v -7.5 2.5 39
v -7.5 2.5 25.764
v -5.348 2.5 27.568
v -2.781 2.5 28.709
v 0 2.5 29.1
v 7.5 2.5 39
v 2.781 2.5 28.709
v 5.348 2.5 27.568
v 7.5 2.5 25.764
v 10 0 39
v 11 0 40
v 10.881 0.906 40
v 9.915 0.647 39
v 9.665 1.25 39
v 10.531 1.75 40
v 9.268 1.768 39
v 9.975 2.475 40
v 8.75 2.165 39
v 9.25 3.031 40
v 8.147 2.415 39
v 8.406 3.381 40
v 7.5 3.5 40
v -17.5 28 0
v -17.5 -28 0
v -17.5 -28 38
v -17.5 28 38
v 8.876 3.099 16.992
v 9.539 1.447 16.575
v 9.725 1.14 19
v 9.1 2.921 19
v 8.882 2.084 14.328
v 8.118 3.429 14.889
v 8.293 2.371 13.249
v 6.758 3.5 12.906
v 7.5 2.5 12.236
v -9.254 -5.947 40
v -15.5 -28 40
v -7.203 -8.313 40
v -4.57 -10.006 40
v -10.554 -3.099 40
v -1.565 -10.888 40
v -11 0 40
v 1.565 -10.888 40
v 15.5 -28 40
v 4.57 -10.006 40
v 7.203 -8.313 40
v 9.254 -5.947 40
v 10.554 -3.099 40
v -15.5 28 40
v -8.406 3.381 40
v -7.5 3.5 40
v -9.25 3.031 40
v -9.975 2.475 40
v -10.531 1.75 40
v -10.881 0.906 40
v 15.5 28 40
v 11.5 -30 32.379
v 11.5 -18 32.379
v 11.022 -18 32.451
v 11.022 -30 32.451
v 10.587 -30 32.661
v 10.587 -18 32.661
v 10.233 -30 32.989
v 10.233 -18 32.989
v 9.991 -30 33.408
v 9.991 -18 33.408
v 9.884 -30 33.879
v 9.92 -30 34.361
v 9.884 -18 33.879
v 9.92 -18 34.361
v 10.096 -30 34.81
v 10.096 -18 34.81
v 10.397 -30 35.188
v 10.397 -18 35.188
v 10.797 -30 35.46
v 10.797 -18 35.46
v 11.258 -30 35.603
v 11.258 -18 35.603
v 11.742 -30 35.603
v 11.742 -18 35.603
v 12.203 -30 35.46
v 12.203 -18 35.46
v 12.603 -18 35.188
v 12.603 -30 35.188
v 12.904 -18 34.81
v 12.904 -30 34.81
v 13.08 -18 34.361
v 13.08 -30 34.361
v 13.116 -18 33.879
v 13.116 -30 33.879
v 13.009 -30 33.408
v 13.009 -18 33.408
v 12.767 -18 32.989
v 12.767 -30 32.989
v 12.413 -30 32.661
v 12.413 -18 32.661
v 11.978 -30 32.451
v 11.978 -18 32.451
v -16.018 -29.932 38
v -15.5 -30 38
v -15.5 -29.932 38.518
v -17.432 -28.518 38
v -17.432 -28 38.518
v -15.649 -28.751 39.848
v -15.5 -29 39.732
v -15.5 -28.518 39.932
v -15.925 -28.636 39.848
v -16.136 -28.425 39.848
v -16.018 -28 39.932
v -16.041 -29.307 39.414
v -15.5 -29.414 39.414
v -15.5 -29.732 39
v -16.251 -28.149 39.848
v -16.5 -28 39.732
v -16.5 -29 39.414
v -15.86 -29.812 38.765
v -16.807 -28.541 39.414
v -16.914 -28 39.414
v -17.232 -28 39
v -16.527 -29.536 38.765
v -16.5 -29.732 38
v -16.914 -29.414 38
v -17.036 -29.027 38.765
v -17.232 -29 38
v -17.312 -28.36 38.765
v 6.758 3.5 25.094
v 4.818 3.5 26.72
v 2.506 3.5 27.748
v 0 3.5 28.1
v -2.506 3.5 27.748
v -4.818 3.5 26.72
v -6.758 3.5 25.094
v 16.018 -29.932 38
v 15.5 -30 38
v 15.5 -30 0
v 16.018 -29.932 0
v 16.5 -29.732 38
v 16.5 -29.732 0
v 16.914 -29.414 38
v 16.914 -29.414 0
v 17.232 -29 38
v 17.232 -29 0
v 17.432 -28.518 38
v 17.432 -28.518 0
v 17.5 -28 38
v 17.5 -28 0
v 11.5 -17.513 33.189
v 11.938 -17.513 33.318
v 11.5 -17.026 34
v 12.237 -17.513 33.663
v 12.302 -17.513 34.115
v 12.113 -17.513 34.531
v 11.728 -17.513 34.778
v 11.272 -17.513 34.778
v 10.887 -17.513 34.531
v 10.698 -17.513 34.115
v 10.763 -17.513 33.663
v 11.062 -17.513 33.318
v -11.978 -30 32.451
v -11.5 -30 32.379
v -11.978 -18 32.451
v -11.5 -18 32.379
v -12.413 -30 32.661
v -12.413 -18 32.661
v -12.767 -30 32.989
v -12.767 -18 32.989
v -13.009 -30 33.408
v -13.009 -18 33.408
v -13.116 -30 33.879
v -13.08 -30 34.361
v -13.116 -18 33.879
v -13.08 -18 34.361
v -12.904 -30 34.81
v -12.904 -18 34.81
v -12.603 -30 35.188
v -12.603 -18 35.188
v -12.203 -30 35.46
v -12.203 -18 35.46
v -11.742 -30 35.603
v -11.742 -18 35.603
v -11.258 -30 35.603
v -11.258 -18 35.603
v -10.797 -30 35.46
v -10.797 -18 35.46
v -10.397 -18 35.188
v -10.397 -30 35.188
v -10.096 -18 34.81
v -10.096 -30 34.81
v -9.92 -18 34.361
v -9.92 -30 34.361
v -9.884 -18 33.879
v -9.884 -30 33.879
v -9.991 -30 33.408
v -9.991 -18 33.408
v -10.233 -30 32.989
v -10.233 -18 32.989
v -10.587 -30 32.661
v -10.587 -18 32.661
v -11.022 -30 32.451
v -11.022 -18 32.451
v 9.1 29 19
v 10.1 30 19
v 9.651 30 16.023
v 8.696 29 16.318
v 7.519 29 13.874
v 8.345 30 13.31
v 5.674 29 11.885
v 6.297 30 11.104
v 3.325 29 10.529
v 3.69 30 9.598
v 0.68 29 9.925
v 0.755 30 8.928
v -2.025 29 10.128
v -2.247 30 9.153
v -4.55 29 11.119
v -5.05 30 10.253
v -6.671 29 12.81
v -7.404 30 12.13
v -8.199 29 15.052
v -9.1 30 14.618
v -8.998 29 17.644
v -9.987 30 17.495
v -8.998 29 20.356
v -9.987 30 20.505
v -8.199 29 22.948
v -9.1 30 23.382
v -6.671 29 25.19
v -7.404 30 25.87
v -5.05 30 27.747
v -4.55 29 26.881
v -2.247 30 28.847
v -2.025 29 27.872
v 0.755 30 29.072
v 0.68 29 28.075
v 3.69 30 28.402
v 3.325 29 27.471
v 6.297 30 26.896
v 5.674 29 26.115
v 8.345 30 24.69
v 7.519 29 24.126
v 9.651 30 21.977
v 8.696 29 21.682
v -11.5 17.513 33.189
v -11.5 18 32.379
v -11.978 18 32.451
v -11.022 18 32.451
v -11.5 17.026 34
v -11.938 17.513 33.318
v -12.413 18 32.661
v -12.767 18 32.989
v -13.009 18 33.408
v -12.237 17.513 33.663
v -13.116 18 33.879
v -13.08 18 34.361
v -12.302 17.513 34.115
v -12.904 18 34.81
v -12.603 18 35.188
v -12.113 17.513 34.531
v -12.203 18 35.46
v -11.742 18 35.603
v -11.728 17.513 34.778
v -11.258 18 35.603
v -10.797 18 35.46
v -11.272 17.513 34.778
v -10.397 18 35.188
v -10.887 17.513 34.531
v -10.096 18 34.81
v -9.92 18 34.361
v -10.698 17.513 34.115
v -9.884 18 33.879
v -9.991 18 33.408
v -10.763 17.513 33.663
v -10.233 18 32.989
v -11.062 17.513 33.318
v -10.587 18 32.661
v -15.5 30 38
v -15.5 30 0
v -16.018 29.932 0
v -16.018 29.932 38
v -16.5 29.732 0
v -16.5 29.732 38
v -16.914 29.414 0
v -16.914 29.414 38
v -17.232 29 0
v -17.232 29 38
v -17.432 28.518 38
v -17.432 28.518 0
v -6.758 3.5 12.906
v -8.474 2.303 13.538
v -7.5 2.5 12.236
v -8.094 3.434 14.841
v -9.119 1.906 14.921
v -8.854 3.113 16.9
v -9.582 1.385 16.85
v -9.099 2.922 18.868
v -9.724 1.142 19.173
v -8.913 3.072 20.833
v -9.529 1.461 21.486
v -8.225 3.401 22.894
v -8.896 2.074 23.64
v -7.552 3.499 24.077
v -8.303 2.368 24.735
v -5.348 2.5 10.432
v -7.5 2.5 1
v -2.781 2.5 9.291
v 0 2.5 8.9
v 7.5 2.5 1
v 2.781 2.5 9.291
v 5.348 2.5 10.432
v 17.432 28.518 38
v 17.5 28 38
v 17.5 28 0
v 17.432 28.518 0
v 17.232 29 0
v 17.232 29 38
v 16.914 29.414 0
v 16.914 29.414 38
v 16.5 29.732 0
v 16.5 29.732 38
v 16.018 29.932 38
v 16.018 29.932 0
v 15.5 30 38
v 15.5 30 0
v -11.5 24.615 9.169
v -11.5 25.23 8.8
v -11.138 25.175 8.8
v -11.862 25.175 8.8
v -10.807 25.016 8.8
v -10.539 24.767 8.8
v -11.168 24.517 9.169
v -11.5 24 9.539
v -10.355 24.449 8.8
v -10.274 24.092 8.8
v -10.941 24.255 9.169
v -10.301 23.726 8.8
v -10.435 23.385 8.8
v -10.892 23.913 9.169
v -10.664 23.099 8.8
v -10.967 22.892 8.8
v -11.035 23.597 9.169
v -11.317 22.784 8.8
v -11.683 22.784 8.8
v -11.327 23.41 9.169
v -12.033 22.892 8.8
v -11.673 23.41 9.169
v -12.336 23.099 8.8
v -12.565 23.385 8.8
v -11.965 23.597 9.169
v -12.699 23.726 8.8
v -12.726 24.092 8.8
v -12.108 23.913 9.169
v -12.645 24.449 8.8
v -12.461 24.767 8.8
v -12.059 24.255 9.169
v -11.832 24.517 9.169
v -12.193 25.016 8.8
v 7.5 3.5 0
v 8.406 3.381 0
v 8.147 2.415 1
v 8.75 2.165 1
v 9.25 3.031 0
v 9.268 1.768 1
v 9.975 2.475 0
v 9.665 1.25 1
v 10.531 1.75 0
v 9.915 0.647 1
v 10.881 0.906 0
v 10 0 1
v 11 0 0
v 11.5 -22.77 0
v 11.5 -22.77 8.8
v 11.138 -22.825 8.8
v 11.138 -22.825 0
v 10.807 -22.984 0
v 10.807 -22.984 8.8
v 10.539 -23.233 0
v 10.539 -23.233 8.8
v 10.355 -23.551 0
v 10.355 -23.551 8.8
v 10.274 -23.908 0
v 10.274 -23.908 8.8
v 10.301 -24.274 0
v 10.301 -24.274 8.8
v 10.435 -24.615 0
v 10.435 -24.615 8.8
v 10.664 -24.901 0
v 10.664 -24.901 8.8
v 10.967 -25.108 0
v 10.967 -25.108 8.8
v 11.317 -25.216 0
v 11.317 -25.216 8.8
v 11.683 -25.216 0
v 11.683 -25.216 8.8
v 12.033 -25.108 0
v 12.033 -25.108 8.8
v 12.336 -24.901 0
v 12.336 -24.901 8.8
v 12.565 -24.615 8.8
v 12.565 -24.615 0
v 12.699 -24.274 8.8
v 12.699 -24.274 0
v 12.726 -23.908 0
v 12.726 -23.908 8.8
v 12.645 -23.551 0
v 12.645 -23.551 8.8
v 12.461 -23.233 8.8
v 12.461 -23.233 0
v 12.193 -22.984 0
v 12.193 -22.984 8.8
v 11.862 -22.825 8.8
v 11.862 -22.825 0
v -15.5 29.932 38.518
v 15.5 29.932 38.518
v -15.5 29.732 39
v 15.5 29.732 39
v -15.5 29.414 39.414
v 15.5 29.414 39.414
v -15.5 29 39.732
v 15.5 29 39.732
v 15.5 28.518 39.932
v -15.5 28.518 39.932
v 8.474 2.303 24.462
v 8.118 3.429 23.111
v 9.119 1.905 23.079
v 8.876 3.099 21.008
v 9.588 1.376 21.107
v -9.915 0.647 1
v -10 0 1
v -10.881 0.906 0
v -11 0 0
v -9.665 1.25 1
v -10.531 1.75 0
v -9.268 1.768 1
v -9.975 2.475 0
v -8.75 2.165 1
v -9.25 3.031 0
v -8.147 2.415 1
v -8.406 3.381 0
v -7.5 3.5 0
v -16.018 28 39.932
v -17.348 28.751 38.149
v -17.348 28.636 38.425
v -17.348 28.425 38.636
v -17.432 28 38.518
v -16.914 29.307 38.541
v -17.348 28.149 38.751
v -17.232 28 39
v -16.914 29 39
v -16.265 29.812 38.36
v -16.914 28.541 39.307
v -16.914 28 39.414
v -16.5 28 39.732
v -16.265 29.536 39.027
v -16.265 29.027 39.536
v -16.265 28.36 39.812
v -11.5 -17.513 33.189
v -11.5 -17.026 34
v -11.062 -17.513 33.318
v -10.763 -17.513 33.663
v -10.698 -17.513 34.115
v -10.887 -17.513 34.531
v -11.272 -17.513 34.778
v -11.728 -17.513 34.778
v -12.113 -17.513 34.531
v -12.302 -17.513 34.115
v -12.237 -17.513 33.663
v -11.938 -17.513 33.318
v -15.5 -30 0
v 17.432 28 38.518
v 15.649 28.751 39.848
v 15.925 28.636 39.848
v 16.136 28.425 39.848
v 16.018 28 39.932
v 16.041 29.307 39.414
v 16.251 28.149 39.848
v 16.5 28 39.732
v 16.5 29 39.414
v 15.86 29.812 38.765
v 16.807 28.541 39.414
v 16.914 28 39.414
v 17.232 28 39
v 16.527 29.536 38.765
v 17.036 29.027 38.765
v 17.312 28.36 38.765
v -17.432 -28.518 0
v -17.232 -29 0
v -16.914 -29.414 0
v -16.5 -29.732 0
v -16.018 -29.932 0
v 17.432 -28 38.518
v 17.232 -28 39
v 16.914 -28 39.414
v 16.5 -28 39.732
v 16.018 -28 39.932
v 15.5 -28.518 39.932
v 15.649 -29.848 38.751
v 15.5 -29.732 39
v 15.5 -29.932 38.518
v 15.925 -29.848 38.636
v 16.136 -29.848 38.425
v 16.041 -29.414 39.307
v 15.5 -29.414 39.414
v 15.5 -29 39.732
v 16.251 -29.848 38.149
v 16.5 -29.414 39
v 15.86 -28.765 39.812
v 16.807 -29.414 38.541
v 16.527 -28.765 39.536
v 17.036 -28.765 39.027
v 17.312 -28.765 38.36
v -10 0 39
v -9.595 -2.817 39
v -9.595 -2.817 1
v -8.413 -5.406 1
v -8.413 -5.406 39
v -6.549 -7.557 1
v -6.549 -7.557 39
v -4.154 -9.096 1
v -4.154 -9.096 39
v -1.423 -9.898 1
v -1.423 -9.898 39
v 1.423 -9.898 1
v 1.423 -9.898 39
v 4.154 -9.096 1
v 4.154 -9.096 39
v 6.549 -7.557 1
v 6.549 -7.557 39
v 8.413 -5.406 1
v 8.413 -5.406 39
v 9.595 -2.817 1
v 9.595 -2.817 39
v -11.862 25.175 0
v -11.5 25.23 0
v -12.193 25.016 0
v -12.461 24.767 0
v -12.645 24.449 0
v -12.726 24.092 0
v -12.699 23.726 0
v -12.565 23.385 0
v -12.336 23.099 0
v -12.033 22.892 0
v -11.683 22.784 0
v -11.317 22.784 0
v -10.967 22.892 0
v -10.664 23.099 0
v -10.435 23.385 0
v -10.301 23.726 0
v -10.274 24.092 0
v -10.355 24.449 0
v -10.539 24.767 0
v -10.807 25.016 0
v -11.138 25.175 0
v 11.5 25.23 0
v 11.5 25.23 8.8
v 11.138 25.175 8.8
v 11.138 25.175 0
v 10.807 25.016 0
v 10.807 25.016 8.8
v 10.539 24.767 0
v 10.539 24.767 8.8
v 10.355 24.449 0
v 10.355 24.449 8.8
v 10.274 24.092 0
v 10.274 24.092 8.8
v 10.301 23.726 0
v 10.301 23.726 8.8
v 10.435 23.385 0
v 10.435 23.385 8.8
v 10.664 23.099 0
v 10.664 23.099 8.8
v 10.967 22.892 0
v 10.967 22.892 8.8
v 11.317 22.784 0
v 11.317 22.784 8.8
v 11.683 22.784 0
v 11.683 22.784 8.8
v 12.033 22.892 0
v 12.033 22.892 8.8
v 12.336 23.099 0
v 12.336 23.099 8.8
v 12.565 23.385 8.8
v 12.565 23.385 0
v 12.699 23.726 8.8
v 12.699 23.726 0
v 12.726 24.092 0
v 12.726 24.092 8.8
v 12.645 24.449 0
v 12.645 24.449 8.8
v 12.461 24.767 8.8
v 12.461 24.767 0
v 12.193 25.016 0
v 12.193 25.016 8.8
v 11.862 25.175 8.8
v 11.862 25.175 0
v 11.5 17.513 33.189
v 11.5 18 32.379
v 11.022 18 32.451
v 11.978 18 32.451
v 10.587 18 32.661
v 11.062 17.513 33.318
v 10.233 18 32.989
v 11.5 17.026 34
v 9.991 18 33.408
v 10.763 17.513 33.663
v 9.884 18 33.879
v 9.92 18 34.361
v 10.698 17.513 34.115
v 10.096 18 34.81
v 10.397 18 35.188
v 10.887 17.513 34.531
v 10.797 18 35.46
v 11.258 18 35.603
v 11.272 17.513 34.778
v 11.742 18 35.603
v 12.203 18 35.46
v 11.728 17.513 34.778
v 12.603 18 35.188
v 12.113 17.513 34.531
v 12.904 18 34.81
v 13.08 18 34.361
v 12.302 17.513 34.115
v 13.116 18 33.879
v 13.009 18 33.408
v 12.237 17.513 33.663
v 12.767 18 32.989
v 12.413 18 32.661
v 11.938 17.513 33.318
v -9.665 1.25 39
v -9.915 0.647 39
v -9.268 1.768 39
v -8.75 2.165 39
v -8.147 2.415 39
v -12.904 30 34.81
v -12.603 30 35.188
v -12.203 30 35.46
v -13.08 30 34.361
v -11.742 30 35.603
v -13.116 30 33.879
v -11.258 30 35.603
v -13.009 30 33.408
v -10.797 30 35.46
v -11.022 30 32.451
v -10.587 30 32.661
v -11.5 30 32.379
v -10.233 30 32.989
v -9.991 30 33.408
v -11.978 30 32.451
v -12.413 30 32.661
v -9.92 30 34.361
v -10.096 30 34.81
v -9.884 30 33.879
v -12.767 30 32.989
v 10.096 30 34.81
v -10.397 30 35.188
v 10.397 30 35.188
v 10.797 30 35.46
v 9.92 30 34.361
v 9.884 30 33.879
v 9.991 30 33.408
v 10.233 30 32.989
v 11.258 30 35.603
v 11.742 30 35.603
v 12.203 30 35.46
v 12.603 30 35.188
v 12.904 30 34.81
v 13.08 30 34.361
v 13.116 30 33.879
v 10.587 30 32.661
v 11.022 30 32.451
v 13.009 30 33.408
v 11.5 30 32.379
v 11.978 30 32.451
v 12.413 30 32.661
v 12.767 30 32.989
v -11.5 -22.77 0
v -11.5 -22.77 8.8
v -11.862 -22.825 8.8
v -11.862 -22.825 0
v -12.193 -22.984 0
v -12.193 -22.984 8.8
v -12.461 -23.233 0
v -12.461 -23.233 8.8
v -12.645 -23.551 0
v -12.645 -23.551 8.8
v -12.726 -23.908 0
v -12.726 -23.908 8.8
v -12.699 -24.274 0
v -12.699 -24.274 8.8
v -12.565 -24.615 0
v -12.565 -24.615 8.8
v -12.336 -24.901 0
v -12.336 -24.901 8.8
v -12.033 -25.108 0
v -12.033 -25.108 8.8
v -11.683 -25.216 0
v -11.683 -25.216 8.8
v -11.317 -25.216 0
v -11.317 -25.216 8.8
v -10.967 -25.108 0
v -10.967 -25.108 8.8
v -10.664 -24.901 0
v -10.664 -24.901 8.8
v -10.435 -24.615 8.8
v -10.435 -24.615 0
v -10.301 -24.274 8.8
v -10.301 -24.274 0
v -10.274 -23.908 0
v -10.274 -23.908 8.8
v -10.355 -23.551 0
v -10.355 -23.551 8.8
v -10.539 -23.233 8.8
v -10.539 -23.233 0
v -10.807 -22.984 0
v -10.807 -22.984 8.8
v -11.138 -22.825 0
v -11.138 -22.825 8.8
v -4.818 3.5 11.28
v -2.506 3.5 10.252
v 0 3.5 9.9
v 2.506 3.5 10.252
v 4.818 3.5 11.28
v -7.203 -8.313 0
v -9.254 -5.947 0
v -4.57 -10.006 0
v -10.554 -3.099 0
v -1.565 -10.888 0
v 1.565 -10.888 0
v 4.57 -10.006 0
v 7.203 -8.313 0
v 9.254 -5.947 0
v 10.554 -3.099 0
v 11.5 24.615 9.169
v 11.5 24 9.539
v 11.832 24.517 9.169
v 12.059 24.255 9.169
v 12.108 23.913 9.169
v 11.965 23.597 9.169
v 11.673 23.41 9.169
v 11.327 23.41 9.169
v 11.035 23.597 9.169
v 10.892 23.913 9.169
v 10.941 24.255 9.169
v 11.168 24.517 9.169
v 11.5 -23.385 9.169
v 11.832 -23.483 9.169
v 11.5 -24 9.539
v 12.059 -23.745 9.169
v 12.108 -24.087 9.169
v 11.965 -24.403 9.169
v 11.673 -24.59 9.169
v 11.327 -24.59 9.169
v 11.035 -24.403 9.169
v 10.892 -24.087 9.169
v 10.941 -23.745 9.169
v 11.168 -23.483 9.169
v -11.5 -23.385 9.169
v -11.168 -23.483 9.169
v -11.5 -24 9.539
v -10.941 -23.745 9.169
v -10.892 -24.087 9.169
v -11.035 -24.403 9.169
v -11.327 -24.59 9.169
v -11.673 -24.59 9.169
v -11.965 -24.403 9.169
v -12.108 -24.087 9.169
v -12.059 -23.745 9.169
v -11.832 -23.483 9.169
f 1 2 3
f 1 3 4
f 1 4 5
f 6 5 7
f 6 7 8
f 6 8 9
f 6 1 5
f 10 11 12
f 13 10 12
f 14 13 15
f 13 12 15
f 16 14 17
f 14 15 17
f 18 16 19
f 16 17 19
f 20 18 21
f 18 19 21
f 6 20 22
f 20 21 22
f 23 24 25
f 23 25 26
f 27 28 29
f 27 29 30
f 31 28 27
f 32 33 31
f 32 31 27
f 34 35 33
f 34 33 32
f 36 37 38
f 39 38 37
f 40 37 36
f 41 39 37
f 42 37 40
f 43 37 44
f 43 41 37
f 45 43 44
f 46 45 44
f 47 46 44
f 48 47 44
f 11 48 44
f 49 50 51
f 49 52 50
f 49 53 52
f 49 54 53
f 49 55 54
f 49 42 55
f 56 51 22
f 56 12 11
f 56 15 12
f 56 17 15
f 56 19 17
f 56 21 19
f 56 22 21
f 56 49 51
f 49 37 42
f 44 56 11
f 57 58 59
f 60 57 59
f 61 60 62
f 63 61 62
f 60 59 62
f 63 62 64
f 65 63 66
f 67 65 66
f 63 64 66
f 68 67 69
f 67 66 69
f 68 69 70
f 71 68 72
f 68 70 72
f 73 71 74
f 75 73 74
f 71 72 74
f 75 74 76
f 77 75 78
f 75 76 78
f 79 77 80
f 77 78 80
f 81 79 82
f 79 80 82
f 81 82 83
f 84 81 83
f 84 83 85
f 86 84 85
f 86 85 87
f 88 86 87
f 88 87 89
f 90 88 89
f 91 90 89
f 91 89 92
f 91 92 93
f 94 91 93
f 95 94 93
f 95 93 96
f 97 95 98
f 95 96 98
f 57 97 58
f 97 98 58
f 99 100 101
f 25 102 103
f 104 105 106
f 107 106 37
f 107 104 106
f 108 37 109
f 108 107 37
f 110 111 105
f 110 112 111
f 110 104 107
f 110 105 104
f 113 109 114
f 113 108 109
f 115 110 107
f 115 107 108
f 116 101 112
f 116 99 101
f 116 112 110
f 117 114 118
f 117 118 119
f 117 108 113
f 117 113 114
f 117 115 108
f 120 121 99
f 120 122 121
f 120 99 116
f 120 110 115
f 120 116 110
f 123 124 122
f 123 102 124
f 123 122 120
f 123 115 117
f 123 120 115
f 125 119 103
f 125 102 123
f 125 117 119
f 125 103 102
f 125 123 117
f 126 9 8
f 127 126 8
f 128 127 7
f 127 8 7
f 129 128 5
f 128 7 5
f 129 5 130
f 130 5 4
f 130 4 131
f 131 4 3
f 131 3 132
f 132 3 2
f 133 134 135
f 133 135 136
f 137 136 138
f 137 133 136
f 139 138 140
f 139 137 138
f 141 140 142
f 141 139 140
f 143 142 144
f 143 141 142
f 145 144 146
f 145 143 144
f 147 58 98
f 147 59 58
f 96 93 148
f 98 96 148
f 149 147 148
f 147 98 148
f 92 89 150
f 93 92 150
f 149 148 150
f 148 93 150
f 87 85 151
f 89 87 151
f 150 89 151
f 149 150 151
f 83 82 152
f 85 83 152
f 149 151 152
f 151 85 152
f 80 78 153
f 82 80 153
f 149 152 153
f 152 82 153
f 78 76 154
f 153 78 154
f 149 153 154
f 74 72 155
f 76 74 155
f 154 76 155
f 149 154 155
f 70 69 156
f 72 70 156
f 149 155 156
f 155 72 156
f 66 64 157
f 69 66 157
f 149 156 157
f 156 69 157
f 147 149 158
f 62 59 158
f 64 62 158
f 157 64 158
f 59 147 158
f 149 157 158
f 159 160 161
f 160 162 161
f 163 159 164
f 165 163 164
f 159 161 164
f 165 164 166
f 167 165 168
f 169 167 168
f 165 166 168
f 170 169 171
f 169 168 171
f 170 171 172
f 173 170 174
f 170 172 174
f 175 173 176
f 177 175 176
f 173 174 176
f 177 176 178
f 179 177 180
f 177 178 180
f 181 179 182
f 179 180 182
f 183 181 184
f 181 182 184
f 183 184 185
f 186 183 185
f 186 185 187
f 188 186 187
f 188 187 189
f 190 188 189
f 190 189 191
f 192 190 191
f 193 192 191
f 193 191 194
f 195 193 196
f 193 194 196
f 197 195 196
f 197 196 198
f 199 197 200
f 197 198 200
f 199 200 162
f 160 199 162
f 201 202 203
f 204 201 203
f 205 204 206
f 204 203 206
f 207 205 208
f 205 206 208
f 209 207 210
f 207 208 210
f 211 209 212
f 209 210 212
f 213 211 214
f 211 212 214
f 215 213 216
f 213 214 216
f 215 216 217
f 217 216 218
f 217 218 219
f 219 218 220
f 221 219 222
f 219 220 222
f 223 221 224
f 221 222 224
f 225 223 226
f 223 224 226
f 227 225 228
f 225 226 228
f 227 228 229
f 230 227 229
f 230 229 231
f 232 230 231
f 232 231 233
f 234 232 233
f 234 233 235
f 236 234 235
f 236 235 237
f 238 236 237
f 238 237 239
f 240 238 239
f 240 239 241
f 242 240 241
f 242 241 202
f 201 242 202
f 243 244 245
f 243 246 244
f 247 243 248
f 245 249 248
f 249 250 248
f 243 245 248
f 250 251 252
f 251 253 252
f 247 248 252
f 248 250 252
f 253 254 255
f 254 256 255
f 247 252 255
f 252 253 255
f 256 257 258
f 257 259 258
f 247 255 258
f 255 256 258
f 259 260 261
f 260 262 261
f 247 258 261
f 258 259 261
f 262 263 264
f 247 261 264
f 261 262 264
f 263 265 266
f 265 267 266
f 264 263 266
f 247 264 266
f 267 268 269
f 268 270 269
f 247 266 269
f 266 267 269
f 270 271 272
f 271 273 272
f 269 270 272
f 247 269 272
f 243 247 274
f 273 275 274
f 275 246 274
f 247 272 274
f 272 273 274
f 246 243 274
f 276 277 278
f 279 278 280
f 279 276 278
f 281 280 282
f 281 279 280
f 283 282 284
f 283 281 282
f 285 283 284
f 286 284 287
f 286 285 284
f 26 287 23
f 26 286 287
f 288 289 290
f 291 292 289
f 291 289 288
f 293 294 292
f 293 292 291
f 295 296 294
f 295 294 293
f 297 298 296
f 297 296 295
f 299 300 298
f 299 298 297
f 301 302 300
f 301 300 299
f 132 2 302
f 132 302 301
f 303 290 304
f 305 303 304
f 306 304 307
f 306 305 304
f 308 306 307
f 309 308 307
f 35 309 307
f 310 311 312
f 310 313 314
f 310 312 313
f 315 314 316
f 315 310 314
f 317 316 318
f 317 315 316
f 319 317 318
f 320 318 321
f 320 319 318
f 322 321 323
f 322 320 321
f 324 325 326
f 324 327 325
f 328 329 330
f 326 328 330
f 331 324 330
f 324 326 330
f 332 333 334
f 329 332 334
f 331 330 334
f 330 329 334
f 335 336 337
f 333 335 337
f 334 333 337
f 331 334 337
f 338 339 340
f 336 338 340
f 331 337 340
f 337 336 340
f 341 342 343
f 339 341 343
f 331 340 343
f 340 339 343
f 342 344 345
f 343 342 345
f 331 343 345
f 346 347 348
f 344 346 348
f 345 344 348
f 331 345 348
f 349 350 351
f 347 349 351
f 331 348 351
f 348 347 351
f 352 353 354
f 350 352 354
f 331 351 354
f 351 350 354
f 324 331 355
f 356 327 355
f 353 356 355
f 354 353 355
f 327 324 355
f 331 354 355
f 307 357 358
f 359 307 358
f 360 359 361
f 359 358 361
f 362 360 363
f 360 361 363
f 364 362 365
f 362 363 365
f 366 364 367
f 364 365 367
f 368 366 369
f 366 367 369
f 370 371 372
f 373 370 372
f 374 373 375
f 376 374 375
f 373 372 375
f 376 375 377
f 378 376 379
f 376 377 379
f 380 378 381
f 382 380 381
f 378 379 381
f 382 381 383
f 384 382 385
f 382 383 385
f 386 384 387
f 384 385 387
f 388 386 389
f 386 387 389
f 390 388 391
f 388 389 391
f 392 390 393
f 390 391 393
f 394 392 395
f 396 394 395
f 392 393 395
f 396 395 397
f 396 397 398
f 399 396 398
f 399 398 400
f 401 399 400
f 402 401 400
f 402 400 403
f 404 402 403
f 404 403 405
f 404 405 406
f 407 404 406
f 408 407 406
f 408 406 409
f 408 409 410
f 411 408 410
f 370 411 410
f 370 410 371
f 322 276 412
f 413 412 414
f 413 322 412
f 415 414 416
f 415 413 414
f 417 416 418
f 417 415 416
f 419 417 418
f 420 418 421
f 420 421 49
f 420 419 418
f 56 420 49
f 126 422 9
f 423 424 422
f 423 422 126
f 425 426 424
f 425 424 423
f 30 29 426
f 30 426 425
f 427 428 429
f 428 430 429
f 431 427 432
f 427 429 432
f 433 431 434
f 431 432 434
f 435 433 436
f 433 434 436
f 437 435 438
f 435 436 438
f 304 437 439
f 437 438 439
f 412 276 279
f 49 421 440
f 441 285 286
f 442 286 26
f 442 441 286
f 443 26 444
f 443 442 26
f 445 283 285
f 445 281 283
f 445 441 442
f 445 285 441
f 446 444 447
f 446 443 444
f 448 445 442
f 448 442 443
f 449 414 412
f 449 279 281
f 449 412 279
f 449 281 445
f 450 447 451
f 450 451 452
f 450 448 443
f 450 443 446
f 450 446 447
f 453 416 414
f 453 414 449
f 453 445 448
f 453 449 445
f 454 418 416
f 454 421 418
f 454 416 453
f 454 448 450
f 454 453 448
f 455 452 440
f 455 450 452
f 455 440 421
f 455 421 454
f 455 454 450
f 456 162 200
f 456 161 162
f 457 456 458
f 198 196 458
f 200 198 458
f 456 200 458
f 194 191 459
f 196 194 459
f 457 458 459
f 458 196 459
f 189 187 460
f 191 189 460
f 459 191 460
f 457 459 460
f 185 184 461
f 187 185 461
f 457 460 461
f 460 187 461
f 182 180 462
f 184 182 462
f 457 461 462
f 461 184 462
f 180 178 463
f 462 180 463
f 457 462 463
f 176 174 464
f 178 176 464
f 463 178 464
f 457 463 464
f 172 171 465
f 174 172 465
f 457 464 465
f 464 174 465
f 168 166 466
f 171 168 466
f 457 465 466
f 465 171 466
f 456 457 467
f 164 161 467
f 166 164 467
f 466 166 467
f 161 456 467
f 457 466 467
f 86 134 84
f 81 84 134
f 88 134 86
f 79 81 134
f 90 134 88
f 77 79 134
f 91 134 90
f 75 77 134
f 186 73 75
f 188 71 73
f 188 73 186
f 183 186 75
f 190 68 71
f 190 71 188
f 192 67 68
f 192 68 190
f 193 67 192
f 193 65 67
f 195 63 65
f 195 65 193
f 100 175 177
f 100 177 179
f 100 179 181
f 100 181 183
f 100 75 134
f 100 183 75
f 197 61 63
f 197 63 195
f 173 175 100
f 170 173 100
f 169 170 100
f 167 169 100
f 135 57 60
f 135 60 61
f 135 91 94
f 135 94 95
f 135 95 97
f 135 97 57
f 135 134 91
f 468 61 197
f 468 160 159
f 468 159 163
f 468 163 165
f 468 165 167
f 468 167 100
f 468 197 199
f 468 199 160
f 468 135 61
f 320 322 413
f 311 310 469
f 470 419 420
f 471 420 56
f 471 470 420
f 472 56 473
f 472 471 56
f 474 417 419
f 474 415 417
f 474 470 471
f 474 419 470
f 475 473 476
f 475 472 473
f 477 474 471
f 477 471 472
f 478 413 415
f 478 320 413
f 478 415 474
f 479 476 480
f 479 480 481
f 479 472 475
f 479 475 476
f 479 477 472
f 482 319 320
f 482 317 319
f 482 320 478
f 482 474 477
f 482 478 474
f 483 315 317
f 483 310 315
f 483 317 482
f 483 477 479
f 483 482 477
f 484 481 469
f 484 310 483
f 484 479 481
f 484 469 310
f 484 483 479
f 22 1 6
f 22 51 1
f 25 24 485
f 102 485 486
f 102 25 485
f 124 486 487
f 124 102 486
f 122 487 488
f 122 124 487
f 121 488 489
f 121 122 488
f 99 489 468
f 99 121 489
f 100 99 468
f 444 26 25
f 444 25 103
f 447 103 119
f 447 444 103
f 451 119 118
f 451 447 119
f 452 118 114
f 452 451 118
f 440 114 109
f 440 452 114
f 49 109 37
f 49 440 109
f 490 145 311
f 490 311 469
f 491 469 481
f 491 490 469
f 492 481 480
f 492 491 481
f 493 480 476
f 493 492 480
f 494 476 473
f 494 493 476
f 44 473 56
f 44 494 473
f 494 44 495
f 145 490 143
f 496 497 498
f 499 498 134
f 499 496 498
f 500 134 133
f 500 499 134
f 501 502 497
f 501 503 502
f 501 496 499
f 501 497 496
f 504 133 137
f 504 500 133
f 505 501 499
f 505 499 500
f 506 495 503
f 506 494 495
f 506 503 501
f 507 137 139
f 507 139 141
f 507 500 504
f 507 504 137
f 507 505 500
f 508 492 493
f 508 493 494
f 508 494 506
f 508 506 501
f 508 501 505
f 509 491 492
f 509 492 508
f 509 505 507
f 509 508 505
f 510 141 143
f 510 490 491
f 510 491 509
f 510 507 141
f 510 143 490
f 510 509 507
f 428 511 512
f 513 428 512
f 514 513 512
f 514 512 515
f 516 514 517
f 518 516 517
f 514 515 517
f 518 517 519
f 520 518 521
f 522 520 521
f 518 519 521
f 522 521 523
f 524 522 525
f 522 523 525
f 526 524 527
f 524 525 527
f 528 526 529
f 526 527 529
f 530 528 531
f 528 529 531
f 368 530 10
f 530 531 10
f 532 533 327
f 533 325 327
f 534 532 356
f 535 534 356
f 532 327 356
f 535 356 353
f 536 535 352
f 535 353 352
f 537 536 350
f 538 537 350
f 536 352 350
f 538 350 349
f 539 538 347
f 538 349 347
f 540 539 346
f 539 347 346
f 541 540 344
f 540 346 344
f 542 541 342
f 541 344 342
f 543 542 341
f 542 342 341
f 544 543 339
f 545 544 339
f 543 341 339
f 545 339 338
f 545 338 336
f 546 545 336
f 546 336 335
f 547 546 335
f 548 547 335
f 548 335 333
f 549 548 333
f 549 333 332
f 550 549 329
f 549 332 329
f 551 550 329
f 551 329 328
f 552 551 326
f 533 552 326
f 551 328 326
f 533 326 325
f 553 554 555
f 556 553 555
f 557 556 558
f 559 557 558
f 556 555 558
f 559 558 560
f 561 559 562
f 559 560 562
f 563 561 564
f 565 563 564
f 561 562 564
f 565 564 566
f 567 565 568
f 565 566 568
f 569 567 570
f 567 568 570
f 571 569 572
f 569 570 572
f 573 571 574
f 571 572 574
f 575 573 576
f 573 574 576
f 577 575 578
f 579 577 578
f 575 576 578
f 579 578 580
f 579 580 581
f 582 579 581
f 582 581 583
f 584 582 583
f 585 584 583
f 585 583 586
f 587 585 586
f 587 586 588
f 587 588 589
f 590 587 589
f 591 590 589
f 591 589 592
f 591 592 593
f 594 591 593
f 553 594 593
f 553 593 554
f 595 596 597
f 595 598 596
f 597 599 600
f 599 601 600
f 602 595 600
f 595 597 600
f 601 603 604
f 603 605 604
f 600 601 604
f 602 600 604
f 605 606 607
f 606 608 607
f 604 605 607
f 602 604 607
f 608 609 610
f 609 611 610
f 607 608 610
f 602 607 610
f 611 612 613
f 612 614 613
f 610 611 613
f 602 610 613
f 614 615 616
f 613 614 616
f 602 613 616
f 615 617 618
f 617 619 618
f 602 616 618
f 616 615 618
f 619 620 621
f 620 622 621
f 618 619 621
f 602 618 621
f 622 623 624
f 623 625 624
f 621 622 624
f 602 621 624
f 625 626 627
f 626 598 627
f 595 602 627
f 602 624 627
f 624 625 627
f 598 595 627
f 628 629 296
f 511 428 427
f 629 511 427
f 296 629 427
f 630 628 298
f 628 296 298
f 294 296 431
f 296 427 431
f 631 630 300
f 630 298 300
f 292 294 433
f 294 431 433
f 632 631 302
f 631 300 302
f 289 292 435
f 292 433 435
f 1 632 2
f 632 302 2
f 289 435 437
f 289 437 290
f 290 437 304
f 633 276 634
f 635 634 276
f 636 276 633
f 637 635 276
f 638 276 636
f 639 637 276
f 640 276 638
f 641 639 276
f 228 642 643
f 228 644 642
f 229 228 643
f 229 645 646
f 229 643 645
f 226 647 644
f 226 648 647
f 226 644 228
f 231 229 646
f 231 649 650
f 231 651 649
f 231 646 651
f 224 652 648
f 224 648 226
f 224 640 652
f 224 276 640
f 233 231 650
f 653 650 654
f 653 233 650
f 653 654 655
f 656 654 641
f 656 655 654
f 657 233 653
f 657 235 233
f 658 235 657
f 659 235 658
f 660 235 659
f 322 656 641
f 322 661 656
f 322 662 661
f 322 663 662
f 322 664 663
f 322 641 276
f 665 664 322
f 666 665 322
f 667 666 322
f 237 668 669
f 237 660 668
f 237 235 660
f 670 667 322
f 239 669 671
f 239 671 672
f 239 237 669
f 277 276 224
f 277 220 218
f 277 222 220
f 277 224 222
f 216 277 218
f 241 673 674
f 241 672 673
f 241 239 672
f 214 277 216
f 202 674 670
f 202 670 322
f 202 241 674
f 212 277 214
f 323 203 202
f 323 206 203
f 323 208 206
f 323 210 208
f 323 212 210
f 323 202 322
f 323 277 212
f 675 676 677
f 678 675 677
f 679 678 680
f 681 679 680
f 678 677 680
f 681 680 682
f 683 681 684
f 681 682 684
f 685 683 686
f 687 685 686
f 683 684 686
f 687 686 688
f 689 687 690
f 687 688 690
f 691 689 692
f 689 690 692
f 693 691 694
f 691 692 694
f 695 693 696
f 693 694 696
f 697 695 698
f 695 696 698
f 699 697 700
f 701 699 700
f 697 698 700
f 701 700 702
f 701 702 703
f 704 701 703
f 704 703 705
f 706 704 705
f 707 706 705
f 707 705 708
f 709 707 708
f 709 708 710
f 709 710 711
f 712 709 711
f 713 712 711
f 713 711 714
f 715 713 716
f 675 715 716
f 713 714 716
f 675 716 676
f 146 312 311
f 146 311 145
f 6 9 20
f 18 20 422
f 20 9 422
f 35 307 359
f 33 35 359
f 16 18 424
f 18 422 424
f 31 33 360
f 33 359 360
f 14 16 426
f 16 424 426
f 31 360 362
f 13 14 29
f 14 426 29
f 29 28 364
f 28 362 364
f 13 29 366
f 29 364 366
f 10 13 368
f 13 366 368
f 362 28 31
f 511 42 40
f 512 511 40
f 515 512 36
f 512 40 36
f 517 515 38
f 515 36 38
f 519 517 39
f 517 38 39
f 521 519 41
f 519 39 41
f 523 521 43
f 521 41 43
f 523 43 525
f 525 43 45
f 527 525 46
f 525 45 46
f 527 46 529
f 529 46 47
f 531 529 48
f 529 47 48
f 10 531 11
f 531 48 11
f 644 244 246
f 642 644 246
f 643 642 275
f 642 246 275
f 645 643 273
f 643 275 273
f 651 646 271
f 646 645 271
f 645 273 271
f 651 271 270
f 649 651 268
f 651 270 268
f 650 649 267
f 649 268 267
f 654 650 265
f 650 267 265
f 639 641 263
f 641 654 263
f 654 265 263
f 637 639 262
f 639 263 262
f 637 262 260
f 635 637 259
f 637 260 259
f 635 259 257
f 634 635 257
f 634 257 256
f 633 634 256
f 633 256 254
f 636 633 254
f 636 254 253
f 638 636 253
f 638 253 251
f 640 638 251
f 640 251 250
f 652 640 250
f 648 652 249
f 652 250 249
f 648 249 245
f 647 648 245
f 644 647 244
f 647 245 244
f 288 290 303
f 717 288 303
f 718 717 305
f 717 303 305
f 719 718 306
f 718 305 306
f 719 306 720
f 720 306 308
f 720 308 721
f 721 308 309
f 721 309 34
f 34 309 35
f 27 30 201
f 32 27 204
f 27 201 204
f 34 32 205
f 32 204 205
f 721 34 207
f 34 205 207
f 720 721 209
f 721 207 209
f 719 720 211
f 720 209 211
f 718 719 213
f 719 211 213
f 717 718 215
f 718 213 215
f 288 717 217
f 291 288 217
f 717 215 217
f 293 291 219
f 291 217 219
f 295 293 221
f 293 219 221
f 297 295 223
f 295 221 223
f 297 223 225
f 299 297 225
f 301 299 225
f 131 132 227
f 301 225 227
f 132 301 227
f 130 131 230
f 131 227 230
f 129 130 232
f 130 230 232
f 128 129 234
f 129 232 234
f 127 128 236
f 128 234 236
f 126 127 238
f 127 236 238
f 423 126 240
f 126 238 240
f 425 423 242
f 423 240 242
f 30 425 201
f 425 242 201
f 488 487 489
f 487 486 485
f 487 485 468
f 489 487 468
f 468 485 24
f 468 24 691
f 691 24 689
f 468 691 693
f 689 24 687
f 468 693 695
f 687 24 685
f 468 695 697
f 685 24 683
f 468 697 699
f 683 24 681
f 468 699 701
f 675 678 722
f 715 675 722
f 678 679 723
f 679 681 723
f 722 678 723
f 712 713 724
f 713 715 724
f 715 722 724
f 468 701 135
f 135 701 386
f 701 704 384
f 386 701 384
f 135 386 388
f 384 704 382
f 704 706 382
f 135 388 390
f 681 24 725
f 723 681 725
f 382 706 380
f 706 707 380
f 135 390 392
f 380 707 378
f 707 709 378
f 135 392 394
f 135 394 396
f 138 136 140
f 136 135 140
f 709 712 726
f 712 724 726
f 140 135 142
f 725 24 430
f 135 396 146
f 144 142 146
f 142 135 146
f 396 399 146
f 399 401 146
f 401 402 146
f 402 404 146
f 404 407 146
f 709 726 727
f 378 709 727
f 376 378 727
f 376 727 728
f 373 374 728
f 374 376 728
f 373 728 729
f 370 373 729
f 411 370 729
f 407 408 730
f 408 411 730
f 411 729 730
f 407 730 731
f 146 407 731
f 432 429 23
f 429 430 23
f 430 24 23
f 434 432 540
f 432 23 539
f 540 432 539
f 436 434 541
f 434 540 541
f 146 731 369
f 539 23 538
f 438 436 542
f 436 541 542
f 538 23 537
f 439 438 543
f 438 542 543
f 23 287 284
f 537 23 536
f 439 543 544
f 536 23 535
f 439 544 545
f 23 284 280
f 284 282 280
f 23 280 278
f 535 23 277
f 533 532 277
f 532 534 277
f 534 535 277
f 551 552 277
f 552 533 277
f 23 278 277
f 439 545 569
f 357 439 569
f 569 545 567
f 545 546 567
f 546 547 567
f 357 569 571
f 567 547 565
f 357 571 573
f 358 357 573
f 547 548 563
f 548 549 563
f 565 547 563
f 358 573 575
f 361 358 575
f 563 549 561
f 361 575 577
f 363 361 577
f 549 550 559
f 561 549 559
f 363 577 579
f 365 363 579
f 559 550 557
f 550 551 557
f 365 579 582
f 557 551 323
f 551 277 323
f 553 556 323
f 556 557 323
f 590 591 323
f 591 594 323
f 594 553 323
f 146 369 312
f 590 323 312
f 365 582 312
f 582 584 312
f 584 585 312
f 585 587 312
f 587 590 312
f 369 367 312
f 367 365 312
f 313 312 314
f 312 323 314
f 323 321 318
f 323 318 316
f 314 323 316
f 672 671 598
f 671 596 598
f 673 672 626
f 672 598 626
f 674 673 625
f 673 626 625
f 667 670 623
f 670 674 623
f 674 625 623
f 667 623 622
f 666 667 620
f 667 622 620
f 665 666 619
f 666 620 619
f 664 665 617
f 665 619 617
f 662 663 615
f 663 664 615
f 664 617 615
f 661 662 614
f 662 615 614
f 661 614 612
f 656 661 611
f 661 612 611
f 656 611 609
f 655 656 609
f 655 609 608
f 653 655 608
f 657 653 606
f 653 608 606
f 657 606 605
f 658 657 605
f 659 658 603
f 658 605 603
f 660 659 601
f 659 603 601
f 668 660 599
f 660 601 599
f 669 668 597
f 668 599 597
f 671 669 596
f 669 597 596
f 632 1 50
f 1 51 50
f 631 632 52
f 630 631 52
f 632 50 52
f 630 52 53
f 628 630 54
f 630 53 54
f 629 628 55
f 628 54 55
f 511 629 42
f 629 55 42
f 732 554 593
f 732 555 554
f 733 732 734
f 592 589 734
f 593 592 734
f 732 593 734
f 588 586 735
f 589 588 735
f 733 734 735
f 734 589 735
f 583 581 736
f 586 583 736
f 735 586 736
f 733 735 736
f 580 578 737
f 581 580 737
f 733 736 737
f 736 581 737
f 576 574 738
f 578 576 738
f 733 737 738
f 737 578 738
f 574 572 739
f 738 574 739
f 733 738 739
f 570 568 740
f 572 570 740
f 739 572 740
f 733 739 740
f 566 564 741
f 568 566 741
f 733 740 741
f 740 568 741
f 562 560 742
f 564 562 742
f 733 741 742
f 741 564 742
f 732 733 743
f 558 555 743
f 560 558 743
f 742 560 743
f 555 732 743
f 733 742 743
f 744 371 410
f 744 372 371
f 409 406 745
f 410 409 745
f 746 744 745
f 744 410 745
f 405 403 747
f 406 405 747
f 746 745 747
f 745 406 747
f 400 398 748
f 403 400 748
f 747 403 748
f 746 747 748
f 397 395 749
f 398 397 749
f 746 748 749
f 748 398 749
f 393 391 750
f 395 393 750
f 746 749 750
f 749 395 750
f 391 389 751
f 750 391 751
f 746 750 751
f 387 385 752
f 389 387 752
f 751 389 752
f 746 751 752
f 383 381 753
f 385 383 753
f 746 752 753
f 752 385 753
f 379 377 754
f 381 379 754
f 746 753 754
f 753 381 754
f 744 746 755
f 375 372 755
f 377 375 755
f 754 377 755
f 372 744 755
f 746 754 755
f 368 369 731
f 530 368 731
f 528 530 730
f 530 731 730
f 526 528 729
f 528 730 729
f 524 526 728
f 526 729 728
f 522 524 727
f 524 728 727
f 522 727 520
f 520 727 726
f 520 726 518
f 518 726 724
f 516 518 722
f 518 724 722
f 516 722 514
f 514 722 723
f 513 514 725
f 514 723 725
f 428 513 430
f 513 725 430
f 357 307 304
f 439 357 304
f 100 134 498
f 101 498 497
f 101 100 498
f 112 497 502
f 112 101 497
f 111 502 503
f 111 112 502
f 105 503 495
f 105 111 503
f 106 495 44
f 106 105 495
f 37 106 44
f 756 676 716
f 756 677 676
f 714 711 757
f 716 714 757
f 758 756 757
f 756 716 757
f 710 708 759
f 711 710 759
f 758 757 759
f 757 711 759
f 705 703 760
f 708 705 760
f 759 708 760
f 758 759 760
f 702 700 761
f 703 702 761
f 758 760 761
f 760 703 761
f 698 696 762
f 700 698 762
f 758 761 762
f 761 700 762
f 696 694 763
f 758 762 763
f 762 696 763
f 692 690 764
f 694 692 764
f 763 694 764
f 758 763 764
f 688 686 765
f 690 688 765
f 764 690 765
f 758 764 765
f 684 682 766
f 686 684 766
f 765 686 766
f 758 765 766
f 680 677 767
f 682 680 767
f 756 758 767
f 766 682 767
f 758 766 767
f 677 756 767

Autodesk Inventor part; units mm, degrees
ref_plane "YZ Plane" through (0, 0, 0) normal (1, 0, 0) x (0, 1, 0)
ref_plane "XZ Plane" through (0, 0, 0) normal (0, 1, 0) x (-1, 0, 0)
ref_plane "XY Plane" through (0, 0, 0) normal (0, 0, 1) x (1, 0, 0)
sketch "Sketch1" plane through (0, 0, 0) normal (0, 0, 1) x (1, 0, 0)
  line L0 (-17.5, 30) -> (17.5, 30)
  line L1 (17.5, 30) -> (17.5, -30)
  line L2 (17.5, -30) -> (-17.5, -30)
  line L3 (-17.5, -30) -> (-17.5, 30)
  line L4 (0, 9.3667) -> (0, 0)
  line L5 (0, 0) -> (7.7585, 0)
  dimension "d0" = 35
  dimension "d1" = 60
extrude "Extrusion1" add sketch "Sketch1" along normal blind 40
sketch "Sketch2" plane through (0, 0, 40) normal (0, 0, 1) x (1, 0, 0)
  arc A0 (-10, 0) -> (10, 0) centre (0, 0) ccw
  line L0 (-17.5, -30) -> (17.5, -30) projected
  line L1 (-10, 0) -> (-10, 2.5)
  line L2 (-10, 2.5) -> (10, 2.5)
  line L3 (10, 2.5) -> (10, 0)
  dimension "d8" = 2.5
  dimension "d9" = 20
  dimension "d80" = 10
extrude "Extrusion2" cut sketch "Sketch2" against normal up to surface (40 mm away)
fillet "Fillet1" radius 2.5 2 edges at (-10, 2.5, 20) (10, 2.5, 20)
sketch "Sketch6" plane through (-17.5, -30, 0) normal (0, -1, 0) x (1, 0, 0)
  line L0 (17.5, 0) -> (17.5, 25.5492)
  line L1 (0, 0) -> (0, 40) construction
  line L2 (0, 40) -> (35, 40) projected
  line L3 (35, 0) -> (35, 40) projected
  point P0 (6, 34)
  point P1 (29, 34)
  dimension "d139" = 6
  dimension "d140" = 6
  dimension "d164" = 6
  dimension "d165" = 6
hole "Hole4" at (-11.5, -30, 34) at (11.5, -30, 34) direction (0, 1, 0) diameter 3.242 depth 12 tip angle 118 thread size "M4x0.7" class "6H" standard "ISO Metric profile"
mirror "Spiegeln3" about plane through (0, 0, 0) normal (0, 1, 0) of "Hole4"
fillet "Rundung2" radius 2 8 edges at (17.5, 30, 20) (0, 30, 40) (17.5, 0, 40) (-17.5, 30, 20) (17.5, -30, 20) (-17.5, -30, 20) (0, -30, 40) (-17.5, 0, 40)
sketch "Skizze23" plane through (-15.5, 30, 0) normal (0, 1, 0) x (1, 0, 0)
  circle A0 centre (15.5, -19) radius 9.1
  line L0 (0, -40) -> (31, -40) projected
  line L1 (-2, 0) -> (-2, -38) projected
  point P0 (15.5, 0)
  dimension "d173" = 18.2
  dimension "d174" = 21
  dimension "d175" = 17.5
extrude "Extrusion14" cut sketch "Skizze23" against normal up to surface
chamfer "Fase1" distance 1 angle 45 14 edges at (-9.1, 30, 19) (0, -10, 0) (9.2679, 1.7679, 0) (0, 2.5, 0) (-9.2679, 1.7679, 0) (0, -10, 40) (-9.2679, 1.7679, 40) (0, 2.5, 40) (9.2679, 1.7679, 40) (0, 2.5, 9.9) (0, 2.5, 28.1) (8.7024, 2.1921, 16.3395) (8.7024, 2.1921, 21.6605) (-9.1, 1.9212, 18.9844)
sketch "Skizze25" plane through (0, 0, 0) normal (0, 0, -1) x (-1, 0, 0)
  line L0 (-17.5, -28) -> (-17.5, 28) projected
  line L1 (15.5, -30) -> (-15.5, -30) projected
  line L2 (17.5, 28) -> (17.5, -28) projected
  line L3 (-15.5, 30) -> (15.5, 30) projected
  point P0 (0, 0)
  point P1 (-11.5, -24)
  point P2 (-11.5, 24)
  point P3 (11.5, 24)
  point P4 (11.5, -24)
  dimension "d191" = 6
  dimension "d192" = 6
  dimension "d193" = 6
  dimension "d194" = 6
hole "Bohrung5" at (11.5, -24, 0) at (11.5, 24, 0) at (-11.5, 24, 0) at (-11.5, -24, 0) direction (0, 0, 1) diameter 2.459 depth 8.8 tip angle 118 thread size "M3x0.5" class "6H" standard "ISO Metric profile"
properties part number "103.003.01_Gehaeuse_Granulatfuehrung" material "Polypropylen"
